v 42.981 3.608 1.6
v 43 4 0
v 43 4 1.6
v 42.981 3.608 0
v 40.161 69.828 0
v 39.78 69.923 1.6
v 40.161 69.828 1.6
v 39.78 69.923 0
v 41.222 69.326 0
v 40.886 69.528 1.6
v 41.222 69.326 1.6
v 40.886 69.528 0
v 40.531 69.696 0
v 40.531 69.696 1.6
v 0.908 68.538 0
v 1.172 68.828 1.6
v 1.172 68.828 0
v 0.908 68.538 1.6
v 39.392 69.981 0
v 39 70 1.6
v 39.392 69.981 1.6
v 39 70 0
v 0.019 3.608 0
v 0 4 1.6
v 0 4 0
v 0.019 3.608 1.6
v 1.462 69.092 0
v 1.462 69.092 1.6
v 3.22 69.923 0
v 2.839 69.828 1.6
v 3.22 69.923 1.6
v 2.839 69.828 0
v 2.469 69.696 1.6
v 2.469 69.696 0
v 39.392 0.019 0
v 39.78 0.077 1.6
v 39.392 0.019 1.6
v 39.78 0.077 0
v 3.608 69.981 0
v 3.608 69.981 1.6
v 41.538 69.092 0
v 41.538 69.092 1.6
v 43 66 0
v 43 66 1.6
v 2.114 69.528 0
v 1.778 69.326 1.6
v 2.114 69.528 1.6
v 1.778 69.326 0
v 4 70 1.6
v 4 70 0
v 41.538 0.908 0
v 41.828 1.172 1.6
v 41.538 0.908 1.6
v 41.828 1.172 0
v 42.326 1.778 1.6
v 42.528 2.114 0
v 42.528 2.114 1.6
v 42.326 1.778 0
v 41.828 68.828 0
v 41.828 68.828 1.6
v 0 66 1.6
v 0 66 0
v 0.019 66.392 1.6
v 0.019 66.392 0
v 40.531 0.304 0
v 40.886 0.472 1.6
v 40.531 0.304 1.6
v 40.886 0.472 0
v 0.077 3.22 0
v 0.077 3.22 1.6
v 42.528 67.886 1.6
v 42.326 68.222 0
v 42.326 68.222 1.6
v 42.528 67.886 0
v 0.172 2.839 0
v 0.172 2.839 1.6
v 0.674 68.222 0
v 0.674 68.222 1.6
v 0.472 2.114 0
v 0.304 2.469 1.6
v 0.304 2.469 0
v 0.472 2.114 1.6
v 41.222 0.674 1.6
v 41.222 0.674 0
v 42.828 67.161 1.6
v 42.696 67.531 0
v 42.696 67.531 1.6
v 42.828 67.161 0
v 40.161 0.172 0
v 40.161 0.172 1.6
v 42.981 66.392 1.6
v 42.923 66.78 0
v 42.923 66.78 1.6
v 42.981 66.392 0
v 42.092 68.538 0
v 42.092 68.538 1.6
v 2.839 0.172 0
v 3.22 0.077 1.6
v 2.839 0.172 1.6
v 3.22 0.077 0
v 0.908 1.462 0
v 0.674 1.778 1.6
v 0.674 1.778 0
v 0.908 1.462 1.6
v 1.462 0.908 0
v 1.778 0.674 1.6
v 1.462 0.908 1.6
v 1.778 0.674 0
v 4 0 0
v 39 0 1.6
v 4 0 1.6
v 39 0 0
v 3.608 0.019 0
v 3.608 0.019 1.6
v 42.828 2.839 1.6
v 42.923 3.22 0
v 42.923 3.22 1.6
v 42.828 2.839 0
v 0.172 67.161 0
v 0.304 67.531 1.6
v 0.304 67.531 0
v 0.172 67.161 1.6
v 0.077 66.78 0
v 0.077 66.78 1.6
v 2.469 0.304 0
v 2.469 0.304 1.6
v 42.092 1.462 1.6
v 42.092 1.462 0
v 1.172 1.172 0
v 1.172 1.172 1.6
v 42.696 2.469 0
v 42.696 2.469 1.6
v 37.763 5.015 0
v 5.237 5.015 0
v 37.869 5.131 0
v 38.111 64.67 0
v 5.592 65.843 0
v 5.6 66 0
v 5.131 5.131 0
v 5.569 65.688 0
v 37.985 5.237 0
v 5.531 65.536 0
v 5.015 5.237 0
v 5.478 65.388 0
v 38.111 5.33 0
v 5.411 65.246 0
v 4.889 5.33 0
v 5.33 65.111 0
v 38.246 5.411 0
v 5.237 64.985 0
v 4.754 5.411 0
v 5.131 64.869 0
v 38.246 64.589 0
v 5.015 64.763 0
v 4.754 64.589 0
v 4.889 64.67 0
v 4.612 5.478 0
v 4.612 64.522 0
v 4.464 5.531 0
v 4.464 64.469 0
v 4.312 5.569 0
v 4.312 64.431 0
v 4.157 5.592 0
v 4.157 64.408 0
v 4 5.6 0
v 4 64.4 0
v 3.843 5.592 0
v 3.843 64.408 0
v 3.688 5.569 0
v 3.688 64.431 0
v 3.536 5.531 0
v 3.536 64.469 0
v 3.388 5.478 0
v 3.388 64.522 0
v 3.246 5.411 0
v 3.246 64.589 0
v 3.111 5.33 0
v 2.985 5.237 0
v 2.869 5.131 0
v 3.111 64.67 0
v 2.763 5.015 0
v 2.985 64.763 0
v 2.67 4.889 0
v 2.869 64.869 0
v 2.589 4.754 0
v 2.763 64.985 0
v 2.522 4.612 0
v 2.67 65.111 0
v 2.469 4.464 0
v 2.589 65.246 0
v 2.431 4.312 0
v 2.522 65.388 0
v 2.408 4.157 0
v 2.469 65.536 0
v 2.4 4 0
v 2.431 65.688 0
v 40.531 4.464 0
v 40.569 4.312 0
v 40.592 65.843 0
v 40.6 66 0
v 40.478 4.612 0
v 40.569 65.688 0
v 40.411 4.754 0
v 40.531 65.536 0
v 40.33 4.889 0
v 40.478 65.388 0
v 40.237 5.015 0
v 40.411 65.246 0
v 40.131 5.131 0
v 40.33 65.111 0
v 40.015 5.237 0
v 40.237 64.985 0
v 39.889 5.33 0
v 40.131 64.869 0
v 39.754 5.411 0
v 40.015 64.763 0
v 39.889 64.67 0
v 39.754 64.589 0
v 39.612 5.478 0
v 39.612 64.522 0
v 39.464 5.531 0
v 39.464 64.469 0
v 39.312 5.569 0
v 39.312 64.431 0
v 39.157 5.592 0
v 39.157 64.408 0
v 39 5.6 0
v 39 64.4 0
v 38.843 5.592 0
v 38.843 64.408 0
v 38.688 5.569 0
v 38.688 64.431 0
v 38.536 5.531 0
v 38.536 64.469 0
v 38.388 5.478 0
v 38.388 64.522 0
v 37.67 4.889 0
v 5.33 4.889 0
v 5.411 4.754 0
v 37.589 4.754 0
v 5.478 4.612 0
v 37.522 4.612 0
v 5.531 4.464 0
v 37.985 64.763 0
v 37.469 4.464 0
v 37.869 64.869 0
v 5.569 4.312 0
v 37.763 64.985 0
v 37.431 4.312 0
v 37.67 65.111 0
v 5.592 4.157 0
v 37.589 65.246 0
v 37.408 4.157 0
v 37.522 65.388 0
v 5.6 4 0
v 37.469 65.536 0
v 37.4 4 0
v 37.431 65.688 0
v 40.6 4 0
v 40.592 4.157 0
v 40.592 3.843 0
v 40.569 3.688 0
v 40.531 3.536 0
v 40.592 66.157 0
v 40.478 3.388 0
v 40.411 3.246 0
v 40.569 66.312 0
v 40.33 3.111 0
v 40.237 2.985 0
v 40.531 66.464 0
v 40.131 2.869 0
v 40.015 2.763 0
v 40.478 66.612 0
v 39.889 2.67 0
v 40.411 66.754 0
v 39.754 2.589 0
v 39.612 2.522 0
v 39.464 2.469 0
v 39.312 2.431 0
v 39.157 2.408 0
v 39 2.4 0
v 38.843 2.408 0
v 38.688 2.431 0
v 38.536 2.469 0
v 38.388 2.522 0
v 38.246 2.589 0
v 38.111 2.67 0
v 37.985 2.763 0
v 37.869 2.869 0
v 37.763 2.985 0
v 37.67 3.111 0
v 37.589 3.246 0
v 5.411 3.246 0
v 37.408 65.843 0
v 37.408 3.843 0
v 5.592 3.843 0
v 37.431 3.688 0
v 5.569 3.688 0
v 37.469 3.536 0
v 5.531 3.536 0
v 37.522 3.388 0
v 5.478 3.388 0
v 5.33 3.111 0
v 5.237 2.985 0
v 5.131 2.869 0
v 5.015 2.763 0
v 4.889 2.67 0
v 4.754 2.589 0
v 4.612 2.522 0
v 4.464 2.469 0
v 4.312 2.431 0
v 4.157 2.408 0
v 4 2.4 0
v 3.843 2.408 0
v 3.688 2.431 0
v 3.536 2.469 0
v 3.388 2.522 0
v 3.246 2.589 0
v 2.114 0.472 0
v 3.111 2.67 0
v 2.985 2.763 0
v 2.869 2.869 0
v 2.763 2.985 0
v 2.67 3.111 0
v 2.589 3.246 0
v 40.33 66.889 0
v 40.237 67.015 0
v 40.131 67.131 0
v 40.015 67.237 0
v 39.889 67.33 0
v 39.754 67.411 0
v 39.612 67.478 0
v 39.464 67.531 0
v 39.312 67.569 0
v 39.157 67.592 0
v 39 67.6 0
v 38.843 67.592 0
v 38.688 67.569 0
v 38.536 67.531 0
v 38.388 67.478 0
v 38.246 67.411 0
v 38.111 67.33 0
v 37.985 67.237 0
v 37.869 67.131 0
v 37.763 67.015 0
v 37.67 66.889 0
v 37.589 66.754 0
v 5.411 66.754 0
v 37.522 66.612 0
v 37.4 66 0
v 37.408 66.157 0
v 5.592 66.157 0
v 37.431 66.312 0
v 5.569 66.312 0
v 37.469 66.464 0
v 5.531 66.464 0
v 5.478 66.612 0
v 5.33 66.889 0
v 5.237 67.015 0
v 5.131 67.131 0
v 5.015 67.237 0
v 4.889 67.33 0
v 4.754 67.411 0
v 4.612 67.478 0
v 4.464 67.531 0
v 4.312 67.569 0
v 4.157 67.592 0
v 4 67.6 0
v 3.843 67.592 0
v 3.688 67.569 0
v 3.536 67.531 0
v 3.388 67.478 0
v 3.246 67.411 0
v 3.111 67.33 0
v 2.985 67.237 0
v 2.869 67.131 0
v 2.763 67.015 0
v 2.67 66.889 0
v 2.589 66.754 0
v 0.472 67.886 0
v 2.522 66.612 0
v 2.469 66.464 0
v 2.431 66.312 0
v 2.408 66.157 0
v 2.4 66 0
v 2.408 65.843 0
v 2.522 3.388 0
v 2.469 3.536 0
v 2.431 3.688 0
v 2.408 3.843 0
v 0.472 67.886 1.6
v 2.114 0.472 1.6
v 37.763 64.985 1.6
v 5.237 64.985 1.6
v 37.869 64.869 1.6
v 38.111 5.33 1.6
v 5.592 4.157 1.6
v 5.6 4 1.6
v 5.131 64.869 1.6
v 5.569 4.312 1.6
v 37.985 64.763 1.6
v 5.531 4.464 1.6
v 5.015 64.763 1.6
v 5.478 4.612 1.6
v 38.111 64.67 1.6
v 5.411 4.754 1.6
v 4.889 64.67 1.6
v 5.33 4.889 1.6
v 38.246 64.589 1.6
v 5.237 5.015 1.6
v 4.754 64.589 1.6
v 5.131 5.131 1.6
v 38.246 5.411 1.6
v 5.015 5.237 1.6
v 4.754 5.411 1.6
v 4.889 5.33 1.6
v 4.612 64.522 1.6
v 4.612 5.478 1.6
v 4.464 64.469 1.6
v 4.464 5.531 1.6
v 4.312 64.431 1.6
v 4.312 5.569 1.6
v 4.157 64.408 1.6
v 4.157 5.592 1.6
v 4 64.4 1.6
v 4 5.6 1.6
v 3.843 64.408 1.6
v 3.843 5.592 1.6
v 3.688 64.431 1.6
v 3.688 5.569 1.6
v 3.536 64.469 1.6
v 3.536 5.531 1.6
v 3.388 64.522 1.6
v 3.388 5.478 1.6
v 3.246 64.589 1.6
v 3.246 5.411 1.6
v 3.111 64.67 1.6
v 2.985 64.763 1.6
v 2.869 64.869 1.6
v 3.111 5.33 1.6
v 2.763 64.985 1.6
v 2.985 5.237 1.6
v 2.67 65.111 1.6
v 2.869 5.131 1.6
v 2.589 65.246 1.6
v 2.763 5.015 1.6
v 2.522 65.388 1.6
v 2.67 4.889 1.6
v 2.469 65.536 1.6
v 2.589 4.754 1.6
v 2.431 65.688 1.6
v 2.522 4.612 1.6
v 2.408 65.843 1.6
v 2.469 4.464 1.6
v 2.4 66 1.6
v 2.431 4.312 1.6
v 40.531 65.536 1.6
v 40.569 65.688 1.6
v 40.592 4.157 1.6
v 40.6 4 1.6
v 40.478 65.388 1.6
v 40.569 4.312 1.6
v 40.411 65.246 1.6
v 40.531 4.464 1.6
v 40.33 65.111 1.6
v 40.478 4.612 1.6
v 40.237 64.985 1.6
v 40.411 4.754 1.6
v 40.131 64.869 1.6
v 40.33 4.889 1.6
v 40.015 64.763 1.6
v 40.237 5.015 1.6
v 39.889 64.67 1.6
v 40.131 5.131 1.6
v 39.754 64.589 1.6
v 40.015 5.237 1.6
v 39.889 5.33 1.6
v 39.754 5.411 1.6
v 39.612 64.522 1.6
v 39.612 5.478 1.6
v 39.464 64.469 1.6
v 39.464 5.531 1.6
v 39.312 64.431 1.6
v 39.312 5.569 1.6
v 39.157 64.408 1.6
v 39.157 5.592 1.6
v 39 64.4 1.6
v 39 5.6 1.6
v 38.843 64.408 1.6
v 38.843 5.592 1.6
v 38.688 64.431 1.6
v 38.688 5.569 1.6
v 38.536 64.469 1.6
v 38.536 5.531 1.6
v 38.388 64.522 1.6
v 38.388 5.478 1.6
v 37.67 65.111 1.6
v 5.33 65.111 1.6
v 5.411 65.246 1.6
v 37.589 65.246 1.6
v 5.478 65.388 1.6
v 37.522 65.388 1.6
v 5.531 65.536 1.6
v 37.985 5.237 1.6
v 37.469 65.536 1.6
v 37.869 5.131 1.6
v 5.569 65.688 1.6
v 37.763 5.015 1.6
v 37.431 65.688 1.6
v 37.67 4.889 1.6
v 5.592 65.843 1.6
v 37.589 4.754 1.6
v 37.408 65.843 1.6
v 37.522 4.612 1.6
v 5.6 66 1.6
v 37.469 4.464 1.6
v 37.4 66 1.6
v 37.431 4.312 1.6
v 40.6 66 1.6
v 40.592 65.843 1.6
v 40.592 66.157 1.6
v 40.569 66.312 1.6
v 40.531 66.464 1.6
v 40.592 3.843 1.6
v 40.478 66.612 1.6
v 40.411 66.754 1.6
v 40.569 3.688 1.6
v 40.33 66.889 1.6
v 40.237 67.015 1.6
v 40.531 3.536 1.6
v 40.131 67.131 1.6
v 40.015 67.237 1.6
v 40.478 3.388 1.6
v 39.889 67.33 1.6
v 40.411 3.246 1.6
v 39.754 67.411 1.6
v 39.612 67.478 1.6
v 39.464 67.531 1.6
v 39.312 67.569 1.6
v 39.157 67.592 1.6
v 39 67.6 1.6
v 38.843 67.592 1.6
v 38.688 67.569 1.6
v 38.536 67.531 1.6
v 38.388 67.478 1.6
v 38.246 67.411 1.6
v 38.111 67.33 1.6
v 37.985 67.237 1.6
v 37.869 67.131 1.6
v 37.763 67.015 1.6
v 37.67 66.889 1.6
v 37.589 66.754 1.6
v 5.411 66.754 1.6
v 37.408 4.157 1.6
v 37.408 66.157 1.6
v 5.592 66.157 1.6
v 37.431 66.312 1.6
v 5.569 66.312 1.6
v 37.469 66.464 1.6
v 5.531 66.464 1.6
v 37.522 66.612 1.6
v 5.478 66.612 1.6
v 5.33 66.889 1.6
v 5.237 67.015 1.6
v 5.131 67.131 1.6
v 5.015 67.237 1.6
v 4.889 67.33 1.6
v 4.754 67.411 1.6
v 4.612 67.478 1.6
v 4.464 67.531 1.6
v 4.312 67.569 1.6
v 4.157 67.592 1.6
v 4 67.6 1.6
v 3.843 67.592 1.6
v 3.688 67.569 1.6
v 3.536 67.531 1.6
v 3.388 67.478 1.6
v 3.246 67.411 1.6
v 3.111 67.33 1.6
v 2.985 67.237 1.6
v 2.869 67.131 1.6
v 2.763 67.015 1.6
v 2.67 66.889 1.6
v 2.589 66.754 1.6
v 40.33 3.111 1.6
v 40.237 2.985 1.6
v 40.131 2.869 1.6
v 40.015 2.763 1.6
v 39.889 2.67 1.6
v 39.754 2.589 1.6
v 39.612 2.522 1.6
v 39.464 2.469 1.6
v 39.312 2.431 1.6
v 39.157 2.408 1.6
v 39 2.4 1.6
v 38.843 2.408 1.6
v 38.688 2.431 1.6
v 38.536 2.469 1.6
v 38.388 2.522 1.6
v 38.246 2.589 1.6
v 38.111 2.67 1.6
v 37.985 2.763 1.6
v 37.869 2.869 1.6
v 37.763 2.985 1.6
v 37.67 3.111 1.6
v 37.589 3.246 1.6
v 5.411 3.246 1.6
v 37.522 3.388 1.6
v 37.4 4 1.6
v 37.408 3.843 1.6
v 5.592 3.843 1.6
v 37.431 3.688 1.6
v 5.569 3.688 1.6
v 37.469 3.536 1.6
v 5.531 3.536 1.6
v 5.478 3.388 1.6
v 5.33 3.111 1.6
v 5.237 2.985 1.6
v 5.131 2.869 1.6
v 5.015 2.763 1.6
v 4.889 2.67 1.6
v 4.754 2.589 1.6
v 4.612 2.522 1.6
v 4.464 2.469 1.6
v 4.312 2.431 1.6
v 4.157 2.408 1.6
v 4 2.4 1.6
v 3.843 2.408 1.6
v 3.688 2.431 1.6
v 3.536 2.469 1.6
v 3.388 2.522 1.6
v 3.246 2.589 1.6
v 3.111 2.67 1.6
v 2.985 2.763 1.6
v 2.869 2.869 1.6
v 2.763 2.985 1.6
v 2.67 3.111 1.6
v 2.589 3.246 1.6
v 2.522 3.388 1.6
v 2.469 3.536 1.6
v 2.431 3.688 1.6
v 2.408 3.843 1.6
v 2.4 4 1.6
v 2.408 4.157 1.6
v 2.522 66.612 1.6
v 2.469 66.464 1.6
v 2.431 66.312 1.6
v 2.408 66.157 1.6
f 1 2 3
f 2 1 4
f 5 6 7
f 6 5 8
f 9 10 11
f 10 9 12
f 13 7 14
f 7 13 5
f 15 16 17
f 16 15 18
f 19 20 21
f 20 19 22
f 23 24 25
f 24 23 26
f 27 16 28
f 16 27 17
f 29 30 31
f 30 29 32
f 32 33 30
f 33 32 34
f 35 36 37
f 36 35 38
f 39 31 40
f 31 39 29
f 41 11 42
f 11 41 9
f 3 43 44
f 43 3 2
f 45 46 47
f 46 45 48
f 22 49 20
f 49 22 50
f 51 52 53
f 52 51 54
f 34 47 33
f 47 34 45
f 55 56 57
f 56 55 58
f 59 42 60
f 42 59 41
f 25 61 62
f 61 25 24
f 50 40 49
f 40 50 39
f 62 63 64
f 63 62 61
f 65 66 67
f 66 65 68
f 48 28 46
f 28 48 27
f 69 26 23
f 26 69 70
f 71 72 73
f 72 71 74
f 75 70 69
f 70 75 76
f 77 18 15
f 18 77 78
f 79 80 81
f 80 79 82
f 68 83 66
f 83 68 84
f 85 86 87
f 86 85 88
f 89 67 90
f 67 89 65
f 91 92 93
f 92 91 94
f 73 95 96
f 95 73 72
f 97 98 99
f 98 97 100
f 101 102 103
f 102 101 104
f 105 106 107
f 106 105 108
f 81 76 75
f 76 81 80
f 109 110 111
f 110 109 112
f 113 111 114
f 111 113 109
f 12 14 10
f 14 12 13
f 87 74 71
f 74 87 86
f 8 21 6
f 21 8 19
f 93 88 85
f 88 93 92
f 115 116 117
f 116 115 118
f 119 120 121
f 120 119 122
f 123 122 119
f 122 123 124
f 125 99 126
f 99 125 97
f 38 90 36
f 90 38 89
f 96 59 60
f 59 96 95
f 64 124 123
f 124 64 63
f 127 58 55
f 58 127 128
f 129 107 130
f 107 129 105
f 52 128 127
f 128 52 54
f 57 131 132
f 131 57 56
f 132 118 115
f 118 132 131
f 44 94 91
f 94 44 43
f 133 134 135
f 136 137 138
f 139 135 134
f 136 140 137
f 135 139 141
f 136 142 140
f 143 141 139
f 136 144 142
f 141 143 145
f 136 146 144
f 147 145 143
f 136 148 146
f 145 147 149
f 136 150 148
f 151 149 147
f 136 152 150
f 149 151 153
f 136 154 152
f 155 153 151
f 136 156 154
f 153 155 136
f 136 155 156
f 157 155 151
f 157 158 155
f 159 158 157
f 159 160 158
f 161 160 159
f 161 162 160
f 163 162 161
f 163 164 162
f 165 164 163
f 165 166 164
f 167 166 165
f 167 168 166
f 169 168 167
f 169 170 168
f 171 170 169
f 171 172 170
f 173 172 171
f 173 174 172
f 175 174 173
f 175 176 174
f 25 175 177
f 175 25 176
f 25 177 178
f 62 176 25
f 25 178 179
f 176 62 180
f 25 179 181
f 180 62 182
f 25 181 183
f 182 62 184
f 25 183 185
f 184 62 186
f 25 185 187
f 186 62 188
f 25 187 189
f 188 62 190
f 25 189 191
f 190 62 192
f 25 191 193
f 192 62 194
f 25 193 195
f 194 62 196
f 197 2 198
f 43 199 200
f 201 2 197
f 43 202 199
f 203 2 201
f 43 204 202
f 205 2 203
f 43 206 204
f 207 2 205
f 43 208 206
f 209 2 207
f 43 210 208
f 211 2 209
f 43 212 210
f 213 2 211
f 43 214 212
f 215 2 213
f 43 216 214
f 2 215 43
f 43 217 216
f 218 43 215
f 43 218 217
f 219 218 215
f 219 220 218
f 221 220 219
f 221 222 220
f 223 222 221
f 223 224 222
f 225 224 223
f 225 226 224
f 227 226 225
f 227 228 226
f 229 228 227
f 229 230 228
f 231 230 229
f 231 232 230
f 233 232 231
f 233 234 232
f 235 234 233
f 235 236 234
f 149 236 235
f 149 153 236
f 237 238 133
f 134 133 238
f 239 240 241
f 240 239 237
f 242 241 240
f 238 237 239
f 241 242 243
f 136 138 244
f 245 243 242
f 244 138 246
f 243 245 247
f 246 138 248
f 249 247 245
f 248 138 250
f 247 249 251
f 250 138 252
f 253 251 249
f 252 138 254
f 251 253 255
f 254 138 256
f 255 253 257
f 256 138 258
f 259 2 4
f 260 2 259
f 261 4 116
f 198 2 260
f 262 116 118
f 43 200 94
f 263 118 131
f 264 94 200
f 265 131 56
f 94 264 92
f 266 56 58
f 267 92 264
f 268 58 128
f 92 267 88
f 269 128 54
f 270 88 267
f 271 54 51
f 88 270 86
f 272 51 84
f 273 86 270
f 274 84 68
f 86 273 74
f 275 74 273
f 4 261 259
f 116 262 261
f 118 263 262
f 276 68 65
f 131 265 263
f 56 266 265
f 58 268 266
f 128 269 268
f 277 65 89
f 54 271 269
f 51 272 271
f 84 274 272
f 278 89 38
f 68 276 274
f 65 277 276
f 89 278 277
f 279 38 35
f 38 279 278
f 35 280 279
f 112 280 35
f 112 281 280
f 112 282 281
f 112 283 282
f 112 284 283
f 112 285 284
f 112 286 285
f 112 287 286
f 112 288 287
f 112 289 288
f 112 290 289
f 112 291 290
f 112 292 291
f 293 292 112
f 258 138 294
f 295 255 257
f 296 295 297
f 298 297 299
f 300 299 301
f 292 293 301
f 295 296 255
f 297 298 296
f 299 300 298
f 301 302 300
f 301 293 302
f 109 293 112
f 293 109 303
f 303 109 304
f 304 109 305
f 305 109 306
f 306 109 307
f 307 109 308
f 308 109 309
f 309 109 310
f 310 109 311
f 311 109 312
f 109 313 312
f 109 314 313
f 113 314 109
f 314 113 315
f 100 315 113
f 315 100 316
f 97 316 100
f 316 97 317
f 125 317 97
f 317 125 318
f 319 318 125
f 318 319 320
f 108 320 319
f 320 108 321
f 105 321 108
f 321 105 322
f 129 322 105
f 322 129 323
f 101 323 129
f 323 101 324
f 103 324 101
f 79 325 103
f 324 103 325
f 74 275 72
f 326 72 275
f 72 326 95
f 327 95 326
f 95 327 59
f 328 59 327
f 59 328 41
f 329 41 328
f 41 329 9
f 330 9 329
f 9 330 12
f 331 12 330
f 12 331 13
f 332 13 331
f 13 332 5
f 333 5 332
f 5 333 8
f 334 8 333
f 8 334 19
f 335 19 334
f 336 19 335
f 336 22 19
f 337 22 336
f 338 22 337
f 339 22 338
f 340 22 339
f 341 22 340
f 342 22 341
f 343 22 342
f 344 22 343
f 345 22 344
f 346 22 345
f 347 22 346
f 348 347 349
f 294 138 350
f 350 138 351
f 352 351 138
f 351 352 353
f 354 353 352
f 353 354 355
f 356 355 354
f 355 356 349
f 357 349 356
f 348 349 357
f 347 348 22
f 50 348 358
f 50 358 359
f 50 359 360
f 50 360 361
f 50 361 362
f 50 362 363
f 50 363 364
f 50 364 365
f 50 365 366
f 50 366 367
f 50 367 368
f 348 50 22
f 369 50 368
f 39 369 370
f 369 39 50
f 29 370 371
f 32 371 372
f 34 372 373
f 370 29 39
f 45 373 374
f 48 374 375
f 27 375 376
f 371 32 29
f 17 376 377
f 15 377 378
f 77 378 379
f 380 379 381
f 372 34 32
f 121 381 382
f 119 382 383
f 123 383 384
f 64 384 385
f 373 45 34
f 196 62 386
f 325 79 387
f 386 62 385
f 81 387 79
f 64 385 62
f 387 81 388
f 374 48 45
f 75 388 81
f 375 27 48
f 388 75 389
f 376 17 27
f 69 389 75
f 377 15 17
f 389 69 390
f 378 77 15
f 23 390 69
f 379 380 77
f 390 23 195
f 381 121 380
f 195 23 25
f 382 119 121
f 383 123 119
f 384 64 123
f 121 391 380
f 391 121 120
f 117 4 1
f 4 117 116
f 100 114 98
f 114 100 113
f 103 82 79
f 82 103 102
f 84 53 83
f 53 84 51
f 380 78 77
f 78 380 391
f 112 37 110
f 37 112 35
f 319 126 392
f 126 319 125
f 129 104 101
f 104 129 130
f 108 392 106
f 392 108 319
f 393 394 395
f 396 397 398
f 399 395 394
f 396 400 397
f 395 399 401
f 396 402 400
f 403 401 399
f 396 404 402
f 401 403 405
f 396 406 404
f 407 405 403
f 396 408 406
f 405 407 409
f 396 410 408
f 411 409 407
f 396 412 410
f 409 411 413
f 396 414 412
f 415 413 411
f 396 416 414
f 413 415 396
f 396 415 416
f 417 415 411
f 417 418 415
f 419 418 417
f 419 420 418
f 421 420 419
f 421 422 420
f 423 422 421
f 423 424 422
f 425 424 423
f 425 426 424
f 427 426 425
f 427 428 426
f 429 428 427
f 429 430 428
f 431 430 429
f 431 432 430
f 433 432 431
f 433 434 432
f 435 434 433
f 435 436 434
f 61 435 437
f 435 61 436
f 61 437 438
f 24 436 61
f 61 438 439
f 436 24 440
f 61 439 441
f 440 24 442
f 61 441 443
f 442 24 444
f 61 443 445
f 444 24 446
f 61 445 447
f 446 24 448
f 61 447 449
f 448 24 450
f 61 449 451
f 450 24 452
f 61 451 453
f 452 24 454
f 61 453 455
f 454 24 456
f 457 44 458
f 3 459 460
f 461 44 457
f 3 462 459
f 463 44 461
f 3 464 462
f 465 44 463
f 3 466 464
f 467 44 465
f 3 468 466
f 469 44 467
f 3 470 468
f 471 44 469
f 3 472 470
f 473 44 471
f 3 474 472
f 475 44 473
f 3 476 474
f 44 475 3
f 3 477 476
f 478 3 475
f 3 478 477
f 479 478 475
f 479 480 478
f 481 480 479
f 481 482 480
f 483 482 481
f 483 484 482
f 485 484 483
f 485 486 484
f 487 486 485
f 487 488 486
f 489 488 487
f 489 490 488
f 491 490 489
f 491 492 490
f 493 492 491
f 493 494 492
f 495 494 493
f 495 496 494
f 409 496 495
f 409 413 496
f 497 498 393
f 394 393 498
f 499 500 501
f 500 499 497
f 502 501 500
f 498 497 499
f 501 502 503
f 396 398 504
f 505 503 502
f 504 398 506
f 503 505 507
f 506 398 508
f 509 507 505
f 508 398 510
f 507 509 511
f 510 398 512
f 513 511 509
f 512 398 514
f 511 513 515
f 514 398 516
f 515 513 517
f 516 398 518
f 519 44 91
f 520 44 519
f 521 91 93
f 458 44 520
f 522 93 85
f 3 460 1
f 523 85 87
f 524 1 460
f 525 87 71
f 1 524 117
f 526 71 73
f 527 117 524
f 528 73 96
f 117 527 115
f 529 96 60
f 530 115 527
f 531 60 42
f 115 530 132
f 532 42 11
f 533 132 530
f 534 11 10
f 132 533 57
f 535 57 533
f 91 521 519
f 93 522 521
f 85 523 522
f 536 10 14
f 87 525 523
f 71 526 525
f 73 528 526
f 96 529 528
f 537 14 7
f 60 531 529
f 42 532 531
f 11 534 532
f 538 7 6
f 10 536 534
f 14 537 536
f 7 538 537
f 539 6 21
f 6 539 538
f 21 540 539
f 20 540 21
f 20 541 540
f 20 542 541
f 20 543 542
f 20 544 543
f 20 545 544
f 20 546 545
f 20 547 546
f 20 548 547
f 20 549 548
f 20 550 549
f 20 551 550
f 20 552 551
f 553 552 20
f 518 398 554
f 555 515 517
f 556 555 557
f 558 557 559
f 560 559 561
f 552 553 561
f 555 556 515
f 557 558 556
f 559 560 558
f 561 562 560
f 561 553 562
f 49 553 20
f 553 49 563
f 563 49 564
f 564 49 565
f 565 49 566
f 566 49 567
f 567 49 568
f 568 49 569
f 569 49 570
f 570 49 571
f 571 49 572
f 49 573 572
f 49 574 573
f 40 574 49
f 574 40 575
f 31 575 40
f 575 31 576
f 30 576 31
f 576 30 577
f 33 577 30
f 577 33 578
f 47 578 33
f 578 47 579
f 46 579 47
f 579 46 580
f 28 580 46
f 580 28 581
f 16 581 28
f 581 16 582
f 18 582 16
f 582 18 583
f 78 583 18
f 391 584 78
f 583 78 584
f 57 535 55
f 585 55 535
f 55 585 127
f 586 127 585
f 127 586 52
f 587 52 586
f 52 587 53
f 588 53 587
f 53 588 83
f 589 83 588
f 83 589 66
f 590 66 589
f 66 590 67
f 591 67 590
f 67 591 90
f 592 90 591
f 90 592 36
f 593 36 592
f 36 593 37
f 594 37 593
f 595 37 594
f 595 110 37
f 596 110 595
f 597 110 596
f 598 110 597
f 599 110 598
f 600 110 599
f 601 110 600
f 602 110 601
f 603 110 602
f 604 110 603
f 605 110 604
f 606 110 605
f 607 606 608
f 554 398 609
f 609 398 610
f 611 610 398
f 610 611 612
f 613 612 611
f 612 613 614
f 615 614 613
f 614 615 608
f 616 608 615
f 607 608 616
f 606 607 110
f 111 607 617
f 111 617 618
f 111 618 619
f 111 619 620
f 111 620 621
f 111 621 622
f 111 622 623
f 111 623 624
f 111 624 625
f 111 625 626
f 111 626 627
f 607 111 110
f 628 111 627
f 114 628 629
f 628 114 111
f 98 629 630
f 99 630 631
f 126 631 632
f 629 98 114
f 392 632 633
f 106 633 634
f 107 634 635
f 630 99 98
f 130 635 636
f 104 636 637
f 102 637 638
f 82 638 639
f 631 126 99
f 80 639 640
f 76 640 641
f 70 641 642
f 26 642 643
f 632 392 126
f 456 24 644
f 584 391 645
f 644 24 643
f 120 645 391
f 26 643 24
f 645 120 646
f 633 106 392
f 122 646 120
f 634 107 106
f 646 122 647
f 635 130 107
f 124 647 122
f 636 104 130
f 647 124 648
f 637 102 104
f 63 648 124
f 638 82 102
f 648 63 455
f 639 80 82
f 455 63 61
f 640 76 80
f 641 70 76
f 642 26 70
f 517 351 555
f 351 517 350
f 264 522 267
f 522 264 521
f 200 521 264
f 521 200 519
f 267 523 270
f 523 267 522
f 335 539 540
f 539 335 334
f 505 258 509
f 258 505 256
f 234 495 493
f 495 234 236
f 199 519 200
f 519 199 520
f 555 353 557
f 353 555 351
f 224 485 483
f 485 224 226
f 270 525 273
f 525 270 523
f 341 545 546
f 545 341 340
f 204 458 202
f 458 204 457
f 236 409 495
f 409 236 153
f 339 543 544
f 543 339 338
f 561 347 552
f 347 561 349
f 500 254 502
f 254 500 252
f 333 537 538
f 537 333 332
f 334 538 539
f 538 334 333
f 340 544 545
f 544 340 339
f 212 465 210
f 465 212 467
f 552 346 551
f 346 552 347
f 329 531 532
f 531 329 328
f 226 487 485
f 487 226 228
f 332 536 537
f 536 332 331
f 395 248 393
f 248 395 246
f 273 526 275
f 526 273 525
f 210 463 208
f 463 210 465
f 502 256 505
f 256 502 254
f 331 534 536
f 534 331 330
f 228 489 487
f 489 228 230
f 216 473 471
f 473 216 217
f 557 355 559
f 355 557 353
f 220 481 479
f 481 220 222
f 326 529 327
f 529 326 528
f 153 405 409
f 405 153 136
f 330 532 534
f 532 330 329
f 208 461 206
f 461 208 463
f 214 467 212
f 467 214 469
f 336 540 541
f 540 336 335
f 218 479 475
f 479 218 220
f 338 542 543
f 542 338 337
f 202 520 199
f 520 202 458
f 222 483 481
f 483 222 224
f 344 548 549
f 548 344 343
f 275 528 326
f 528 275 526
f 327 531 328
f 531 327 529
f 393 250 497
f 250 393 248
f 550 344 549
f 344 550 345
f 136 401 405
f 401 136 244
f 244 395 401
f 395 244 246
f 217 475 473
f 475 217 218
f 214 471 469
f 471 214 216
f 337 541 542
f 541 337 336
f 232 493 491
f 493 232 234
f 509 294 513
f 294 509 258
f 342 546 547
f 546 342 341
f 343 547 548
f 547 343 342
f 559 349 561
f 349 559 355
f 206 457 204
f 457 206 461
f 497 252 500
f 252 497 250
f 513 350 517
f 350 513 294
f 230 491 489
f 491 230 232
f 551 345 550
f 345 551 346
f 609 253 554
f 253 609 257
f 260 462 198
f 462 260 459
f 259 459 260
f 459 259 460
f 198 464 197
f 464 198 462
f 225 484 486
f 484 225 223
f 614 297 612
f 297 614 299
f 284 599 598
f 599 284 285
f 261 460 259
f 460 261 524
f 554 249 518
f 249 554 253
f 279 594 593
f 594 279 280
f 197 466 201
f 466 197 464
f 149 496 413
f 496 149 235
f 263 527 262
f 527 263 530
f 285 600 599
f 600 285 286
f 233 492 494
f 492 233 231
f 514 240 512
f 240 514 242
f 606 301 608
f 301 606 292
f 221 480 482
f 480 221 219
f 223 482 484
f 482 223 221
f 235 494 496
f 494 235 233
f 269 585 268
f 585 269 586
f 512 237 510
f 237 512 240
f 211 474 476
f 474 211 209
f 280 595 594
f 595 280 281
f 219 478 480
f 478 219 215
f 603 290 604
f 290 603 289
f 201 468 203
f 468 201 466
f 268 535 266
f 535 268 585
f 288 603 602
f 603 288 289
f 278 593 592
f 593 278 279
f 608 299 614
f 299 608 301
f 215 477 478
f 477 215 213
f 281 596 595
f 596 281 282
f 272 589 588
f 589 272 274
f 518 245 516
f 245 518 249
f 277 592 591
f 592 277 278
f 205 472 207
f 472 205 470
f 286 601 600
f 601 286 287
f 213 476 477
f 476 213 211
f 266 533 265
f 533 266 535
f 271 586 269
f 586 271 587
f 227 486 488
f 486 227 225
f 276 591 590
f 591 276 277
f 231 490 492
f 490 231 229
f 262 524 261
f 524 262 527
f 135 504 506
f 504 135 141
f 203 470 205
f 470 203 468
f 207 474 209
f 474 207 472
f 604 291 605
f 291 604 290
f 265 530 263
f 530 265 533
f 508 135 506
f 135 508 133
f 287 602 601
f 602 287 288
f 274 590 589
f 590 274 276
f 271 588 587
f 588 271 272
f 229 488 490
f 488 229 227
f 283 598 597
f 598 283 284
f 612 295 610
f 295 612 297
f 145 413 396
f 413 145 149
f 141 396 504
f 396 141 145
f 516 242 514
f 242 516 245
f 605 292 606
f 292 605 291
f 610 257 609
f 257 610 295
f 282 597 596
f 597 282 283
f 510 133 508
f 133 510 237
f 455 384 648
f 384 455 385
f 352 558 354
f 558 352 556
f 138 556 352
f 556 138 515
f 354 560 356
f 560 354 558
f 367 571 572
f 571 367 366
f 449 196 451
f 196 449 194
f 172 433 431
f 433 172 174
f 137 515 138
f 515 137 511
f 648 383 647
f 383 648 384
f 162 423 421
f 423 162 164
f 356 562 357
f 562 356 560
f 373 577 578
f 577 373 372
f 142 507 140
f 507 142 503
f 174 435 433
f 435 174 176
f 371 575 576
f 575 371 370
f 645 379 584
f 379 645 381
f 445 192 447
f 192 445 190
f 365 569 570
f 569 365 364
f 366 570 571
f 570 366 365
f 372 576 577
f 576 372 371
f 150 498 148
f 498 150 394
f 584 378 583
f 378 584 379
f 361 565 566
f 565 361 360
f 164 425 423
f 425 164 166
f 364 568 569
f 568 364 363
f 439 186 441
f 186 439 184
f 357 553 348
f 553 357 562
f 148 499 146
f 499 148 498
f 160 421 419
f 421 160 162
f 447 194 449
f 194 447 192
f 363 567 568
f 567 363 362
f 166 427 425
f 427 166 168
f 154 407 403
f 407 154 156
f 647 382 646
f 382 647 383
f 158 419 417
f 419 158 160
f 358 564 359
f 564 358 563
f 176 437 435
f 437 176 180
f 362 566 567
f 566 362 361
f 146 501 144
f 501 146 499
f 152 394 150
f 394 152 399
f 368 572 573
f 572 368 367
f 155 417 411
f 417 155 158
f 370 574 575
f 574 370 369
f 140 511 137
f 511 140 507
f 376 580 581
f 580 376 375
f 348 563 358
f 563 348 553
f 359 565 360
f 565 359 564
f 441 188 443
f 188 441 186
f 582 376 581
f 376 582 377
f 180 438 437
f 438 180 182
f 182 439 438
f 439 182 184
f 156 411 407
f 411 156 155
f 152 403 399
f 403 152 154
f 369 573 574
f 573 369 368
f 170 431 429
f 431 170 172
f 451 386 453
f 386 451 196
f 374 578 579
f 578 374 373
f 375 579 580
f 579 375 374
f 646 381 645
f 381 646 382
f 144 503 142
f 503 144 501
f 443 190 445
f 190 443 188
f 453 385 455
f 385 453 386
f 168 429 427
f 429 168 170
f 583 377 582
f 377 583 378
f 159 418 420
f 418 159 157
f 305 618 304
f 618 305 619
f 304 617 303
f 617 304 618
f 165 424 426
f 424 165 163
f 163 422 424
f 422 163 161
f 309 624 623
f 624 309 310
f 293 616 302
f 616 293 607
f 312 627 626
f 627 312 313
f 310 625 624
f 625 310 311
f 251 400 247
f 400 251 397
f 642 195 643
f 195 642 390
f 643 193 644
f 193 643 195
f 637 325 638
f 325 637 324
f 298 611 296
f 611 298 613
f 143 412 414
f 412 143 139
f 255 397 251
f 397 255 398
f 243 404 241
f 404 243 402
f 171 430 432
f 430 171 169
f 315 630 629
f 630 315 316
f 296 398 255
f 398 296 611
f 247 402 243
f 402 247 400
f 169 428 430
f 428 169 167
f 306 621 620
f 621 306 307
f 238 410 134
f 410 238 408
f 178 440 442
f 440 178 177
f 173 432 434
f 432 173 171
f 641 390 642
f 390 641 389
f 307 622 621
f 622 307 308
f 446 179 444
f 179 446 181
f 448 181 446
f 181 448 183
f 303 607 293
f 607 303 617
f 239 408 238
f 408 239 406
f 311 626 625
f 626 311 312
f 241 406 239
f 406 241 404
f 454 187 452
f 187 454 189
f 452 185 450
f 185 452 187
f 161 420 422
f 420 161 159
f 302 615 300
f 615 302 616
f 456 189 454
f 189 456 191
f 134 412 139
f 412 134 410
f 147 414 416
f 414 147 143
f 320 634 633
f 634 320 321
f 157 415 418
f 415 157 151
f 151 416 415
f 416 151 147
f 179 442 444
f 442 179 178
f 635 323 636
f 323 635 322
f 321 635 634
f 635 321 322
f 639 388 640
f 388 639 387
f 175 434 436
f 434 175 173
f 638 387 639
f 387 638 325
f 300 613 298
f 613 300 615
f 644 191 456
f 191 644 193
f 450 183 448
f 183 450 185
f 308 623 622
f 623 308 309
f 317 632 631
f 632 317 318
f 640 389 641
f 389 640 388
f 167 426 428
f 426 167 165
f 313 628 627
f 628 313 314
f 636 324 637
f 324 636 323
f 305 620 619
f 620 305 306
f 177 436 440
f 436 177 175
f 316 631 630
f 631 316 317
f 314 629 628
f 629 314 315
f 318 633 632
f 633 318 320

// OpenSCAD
$fn=64;

module board(xdim, ydim) {
	zdim=1.6;
	rdim =4;
	difference(){hull() {
		translate([rdim,rdim,0])cylinder(r=rdim, h=zdim);
		translate([xdim-rdim,rdim,0])cylinder(r=rdim, h=zdim);
		translate([rdim,ydim-rdim,0])cylinder(r=rdim, h=zdim);
		translate([xdim-rdim,ydim-rdim,0])cylinder(r=rdim, h=zdim);
	};

	translate([xdim-4,ydim-4,-0.1])cylinder(zdim*2,3.2/2,3.2/2);
	translate([xdim-4,4,-0.1])cylinder(zdim*2,3.2/2,3.2/2);
	translate([4,ydim-4,-0.1])cylinder(zdim*2,3.2/2,3.2/2);
	translate([4,4,-0.1])cylinder(zdim*2,3.2/2,3.2/2);
};
}

module pcb()
{
	color("red")board(43,70);
}

pcb();
